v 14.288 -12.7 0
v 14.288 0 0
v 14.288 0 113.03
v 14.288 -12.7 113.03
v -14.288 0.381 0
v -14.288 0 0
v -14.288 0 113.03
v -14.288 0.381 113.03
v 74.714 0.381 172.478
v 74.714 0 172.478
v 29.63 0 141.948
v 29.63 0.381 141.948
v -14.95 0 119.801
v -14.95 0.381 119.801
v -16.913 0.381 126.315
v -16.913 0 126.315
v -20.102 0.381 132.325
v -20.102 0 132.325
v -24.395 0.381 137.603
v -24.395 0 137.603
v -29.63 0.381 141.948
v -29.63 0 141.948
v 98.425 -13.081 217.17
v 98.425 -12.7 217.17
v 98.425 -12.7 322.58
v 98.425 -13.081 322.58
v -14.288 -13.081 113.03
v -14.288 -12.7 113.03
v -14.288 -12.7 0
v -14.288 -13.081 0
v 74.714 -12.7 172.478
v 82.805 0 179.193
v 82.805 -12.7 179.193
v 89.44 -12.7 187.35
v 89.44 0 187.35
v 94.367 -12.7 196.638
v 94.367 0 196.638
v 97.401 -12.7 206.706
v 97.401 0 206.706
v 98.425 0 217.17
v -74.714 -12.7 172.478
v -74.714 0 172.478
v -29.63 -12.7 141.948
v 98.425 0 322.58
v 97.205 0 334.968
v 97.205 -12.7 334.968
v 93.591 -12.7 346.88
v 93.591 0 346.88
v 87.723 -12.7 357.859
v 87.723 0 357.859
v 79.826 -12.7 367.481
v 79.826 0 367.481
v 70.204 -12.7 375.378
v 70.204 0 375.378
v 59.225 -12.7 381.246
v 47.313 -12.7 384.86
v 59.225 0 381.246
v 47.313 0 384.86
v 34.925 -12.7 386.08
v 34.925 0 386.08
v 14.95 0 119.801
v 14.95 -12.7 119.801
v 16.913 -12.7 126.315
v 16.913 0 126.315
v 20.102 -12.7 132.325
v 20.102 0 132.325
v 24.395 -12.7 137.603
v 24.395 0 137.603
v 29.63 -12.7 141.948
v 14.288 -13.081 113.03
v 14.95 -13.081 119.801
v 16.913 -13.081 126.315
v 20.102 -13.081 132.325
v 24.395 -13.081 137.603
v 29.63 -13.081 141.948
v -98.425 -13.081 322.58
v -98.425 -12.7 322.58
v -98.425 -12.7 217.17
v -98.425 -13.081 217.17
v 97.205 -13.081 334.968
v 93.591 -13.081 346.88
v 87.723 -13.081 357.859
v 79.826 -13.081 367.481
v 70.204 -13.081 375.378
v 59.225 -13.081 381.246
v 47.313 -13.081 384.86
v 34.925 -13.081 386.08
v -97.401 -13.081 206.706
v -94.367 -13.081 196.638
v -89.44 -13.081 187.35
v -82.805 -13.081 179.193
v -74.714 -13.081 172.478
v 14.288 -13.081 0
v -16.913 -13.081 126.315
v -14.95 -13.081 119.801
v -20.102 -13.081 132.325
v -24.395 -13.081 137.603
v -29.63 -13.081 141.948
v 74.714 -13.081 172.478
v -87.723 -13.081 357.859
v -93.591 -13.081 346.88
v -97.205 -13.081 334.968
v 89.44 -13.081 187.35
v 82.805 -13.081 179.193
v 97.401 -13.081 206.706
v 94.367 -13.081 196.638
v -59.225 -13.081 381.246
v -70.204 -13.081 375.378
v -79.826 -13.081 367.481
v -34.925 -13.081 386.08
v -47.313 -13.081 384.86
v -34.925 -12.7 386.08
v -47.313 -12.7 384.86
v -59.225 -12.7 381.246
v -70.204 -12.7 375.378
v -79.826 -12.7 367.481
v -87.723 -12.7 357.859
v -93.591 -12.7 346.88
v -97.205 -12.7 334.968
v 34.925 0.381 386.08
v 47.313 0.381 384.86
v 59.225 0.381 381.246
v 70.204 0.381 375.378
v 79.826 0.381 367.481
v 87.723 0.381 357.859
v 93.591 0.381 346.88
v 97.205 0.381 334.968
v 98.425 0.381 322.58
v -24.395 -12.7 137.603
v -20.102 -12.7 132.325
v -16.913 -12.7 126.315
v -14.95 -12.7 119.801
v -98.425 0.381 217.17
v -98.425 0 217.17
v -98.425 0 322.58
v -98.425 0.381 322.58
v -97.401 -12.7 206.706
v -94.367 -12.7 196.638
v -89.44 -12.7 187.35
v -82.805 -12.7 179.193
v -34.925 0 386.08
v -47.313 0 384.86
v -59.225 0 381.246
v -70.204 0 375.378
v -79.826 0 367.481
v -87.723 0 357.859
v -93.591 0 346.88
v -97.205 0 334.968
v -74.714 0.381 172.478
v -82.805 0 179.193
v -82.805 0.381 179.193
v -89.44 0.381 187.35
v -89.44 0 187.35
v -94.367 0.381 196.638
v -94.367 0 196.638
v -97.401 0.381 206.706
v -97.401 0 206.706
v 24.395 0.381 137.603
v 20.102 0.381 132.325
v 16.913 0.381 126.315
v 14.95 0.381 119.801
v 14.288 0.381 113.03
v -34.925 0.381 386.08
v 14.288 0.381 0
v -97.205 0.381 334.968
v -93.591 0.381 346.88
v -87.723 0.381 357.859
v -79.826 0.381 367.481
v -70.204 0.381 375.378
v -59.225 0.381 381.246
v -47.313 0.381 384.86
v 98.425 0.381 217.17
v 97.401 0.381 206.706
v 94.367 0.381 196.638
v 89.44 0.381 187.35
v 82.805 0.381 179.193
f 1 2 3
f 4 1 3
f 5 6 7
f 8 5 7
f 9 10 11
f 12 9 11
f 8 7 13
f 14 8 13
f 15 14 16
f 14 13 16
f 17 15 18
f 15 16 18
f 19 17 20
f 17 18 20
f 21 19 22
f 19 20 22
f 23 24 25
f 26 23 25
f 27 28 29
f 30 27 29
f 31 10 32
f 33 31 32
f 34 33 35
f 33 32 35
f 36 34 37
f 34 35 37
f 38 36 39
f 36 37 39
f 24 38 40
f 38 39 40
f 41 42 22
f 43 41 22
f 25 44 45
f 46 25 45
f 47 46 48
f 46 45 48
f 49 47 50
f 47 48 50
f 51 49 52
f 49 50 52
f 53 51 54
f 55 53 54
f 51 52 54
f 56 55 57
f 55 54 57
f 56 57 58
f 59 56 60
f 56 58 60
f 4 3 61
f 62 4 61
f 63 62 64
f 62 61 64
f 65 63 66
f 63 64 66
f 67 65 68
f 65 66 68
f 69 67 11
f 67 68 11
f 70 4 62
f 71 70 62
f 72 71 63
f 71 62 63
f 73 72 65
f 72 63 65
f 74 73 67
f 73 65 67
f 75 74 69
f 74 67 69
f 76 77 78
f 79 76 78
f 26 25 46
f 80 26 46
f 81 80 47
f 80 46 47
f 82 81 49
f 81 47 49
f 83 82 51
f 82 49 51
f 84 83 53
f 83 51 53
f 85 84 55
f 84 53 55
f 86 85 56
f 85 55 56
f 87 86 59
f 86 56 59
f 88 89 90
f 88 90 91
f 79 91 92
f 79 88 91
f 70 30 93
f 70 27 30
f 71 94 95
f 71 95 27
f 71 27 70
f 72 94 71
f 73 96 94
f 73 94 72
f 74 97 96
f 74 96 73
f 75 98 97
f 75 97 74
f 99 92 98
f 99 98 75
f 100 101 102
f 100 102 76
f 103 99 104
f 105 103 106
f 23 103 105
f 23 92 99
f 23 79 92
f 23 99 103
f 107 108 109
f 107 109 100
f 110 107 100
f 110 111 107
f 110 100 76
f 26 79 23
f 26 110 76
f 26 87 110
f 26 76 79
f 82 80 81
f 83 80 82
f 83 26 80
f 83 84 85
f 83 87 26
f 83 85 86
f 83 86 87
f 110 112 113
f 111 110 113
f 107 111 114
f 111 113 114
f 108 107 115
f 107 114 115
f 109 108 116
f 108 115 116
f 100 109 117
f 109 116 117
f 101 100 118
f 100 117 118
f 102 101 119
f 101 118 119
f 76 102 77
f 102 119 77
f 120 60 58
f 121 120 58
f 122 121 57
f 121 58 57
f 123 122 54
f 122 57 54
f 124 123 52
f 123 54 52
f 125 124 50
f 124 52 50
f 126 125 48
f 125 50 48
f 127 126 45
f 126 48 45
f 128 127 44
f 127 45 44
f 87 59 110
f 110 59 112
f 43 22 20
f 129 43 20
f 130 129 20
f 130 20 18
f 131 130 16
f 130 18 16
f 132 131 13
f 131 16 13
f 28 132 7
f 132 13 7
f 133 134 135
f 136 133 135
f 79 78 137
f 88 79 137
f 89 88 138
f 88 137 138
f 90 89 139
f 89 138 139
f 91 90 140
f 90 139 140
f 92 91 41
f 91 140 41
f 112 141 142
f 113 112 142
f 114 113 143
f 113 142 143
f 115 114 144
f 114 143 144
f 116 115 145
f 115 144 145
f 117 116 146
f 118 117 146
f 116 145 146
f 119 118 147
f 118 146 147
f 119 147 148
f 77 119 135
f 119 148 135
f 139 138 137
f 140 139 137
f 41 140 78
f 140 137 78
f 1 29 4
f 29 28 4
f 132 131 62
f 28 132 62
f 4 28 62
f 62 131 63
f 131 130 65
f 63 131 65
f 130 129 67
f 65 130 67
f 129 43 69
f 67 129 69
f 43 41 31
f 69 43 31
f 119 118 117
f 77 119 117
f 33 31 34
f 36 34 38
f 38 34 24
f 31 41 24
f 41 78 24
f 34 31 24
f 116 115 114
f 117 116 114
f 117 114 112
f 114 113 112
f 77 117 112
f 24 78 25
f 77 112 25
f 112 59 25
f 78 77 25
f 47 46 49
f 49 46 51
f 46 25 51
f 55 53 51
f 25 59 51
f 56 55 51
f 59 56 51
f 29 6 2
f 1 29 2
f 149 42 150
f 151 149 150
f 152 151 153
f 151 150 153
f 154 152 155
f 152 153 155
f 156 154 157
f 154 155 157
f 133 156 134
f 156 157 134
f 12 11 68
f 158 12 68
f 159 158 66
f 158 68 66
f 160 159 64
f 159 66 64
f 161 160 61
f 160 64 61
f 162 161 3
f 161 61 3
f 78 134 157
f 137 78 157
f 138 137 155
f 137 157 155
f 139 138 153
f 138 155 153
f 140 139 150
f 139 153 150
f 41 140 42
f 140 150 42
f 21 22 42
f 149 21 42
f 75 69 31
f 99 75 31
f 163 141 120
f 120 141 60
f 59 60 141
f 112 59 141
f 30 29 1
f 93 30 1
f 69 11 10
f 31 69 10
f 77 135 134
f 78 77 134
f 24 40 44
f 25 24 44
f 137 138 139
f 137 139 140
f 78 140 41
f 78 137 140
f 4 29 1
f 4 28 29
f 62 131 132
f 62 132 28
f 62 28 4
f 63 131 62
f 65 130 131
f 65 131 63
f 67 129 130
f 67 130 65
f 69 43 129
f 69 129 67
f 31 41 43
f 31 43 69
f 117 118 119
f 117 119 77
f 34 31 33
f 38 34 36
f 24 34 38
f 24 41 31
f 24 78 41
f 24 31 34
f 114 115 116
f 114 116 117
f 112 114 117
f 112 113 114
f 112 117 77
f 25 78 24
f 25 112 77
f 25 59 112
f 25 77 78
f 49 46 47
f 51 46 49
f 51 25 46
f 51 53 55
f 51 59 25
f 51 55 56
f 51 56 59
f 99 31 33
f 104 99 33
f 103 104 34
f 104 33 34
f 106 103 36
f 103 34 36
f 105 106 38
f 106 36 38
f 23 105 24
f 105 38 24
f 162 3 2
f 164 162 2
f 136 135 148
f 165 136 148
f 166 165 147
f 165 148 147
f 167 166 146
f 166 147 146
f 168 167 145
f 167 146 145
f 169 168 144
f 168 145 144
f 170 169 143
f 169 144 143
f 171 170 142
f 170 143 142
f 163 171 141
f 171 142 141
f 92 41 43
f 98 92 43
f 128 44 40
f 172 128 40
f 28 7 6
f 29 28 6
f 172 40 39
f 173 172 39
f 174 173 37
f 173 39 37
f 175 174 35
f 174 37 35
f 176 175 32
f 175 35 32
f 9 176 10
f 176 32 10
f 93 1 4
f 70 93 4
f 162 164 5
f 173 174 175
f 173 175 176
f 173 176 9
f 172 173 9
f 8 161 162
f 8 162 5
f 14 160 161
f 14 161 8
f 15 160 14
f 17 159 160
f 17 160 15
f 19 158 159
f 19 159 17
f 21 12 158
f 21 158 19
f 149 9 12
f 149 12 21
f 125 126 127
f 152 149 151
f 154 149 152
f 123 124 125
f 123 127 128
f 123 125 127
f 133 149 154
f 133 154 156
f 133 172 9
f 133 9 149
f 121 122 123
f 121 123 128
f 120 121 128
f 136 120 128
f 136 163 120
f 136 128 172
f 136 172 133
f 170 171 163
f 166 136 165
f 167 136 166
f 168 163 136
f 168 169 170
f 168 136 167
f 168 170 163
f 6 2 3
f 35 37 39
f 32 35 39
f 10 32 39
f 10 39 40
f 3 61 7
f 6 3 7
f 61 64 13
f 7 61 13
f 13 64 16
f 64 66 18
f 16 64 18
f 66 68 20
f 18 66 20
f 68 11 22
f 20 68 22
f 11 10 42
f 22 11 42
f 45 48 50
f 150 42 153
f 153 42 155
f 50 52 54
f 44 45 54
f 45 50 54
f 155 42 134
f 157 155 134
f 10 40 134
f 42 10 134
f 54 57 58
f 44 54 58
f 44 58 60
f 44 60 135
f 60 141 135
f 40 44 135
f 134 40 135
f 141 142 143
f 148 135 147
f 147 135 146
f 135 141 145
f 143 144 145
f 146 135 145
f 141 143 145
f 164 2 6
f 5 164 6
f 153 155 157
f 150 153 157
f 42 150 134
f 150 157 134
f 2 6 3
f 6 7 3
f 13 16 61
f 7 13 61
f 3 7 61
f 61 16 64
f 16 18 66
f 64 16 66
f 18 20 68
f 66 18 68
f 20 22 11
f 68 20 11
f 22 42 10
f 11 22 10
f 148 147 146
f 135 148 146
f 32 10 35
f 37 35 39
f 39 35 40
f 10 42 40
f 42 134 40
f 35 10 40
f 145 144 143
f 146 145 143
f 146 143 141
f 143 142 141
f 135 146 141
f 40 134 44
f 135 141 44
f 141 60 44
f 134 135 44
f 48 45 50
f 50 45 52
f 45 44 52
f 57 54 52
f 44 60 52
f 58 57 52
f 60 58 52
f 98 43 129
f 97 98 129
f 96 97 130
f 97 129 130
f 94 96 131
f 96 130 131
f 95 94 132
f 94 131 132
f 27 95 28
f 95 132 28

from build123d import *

# Parameters (mm, degrees)
F1_DEPTH = 12.7
F3_DEPTH = 0.381
F5_DEPTH = 0.381


with BuildPart() as f1:
    # F0 (on Front) → F1 (new body)
    with BuildSketch(Plane.XZ):
        with BuildLine():
            Line((-14.2875, 0), (0, 0))
            Line((0, 0), (14.2875, 0))
            Line((14.2875, 0), (14.2875, 113.03))
            ThreePointArc((14.2875, 113.03), (18.36062, 129.398175), (29.629928, 141.94848))
            Line((29.629928, 141.94848), (74.713976, 172.477804))
            ThreePointArc((74.713976, 172.477804), (92.130178, 191.87373), (98.425, 217.17))
            Line((98.425, 217.17), (98.425, 322.58))
            ThreePointArc((98.425, 322.58), (79.826281, 367.481281), (34.925, 386.08))
            Line((34.925, 386.08), (0, 386.08))
            Line((0, 386.08), (-34.925, 386.08))
            ThreePointArc((-34.925, 386.08), (-79.826281, 367.481281), (-98.425, 322.58))
            Line((-98.425, 322.58), (-98.425, 217.17))
            ThreePointArc((-98.425, 217.17), (-92.130178, 191.87373), (-74.713976, 172.477804))
            Line((-74.713976, 172.477804), (-29.629928, 141.94848))
            ThreePointArc((-29.629928, 141.94848), (-18.36062, 129.398175), (-14.2875, 113.03))
            Line((-14.2875, 113.03), (-14.2875, 0))
        make_face()
    extrude(amount=F1_DEPTH)


with BuildPart() as f3:
    # F2 (on face) → F3 (new body)
    with BuildSketch(Plane.XZ.offset(12.7)):
        with BuildLine():
            Line((-14.2875, 0), (14.2875, 0))
            Line((14.2875, 0), (14.2875, 113.03))
            ThreePointArc((14.2875, 113.03), (18.36062, 129.398175), (29.629928, 141.94848))
            Line((29.629928, 141.94848), (74.713976, 172.477804))
            ThreePointArc((74.713976, 172.477804), (92.130178, 191.87373), (98.425, 217.17))
            Line((98.425, 217.17), (98.425, 322.58))
            ThreePointArc((98.425, 322.58), (79.826281, 367.481281), (34.925, 386.08))
            Line((34.925, 386.08), (-34.925, 386.08))
            ThreePointArc((-34.925, 386.08), (-79.826281, 367.481281), (-98.425, 322.58))
            Line((-98.425, 322.58), (-98.425, 217.17))
            ThreePointArc((-98.425, 217.17), (-92.130178, 191.87373), (-74.713976, 172.477804))
            Line((-74.713976, 172.477804), (-29.629928, 141.94848))
            ThreePointArc((-29.629928, 141.94848), (-18.36062, 129.398175), (-14.2875, 113.03))
            Line((-14.2875, 113.03), (-14.2875, 0))
        make_face()
    extrude(amount=F3_DEPTH)


with BuildPart() as f5:
    # F4 (on face) → F5 (new body)
    with BuildSketch(Plane(origin=(0, 0, 0), x_dir=(-1, 0, 0), z_dir=(0, 1, 0))):
        with BuildLine():
            Line((-14.2875, 113.03), (-14.2875, 0))
            Line((-14.2875, 0), (14.2875, 0))
            Line((14.2875, 0), (14.2875, 113.03))
            ThreePointArc((14.2875, 113.03), (18.36062, 129.398175), (29.629928, 141.94848))
            Line((29.629928, 141.94848), (74.713976, 172.477804))
            ThreePointArc((74.713976, 172.477804), (92.130178, 191.87373), (98.425, 217.17))
            Line((98.425, 217.17), (98.425, 322.58))
            ThreePointArc((98.425, 322.58), (79.826281, 367.481281), (34.925, 386.08))
            Line((34.925, 386.08), (-34.925, 386.08))
            ThreePointArc((-34.925, 386.08), (-79.826281, 367.481281), (-98.425, 322.58))
            Line((-98.425, 322.58), (-98.425, 217.17))
            ThreePointArc((-98.425, 217.17), (-92.130178, 191.87373), (-74.713976, 172.477804))
            Line((-74.713976, 172.477804), (-29.629928, 141.94848))
            ThreePointArc((-29.629928, 141.94848), (-18.36062, 129.398175), (-14.2875, 113.03))
        make_face()
    extrude(amount=F5_DEPTH)


solid = Compound([f1.part, f3.part, f5.part])
